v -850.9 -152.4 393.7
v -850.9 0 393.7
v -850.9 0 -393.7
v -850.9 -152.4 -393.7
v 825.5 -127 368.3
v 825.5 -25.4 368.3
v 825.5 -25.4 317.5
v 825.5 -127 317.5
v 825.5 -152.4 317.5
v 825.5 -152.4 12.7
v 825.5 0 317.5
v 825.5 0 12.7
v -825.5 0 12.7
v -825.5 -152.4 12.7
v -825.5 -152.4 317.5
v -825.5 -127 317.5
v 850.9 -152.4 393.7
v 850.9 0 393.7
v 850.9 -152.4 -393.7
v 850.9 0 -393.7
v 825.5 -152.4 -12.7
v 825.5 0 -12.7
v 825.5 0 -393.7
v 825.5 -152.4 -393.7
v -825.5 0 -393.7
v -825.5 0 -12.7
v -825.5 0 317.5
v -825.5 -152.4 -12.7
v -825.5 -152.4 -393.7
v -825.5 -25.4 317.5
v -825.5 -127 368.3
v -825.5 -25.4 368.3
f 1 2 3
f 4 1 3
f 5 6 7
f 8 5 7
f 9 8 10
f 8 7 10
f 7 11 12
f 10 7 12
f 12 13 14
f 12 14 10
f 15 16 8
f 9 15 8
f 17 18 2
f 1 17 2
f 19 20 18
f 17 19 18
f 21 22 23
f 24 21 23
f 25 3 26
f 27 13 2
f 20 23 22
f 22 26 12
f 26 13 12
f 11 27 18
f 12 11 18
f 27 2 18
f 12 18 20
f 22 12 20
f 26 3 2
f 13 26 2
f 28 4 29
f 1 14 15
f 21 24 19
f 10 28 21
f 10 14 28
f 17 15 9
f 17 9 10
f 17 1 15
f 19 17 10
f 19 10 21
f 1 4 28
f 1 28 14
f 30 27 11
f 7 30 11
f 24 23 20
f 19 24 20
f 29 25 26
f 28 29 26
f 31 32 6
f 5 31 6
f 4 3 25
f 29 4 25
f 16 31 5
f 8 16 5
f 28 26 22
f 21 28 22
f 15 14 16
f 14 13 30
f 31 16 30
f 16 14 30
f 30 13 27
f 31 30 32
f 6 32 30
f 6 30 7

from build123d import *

# Parameters (mm, degrees)
F0_W      = 1651
F0_H      = 25.4
F1_DEPTH  = 152.4
F0_H_2    = 50.8
F2_DEPTH  = 25.4
F3_START  = 101.6
F2_FACE_W = 1651
F2_FACE_H = 50.8
F3_DEPTH  = 25.4


# Not quite as in the source:
# - a feature names something its author has since deleted; it is built from what else it names


with BuildPart() as f1:
    # F0 (on Front) → F1 (new body)
    with BuildSketch(Plane.XZ):
        Polygon((-850.9, 368.3), (-850.9, -393.7), (-825.5, -393.7), (-825.5, -12.7), (-825.5, 12.7), (-825.5, 317.5), (-825.5, 368.3), align=None)
        Polygon((-850.9, 393.7), (-850.9, 368.3), (-825.5, 368.3), (825.5, 368.3), (850.9, 368.3), (850.9, 393.7), align=None)
        Polygon((825.5, 12.7), (825.5, -12.7), (825.5, -393.7), (850.9, -393.7), (850.9, 368.3), (825.5, 368.3), (825.5, 317.5), align=None)
        Rectangle(F0_W, F0_H)
    extrude(amount=F1_DEPTH)

    # F0 (on Front) → F2 (join)
    with BuildSketch(Plane.XZ):
        with Locations((0, 342.9)):
            Rectangle(F0_W, F0_H_2)
    extrude(amount=F2_DEPTH)

    # F2_face (on face) → F3 (join)
    with BuildSketch(Plane(origin=(0, -25.4, 342.9), x_dir=(1, 0, 0), z_dir=(0, -1, 0)).offset(F3_START)):
        Rectangle(F2_FACE_W, F2_FACE_H)
    extrude(amount=F3_DEPTH)


solid = f1.part
